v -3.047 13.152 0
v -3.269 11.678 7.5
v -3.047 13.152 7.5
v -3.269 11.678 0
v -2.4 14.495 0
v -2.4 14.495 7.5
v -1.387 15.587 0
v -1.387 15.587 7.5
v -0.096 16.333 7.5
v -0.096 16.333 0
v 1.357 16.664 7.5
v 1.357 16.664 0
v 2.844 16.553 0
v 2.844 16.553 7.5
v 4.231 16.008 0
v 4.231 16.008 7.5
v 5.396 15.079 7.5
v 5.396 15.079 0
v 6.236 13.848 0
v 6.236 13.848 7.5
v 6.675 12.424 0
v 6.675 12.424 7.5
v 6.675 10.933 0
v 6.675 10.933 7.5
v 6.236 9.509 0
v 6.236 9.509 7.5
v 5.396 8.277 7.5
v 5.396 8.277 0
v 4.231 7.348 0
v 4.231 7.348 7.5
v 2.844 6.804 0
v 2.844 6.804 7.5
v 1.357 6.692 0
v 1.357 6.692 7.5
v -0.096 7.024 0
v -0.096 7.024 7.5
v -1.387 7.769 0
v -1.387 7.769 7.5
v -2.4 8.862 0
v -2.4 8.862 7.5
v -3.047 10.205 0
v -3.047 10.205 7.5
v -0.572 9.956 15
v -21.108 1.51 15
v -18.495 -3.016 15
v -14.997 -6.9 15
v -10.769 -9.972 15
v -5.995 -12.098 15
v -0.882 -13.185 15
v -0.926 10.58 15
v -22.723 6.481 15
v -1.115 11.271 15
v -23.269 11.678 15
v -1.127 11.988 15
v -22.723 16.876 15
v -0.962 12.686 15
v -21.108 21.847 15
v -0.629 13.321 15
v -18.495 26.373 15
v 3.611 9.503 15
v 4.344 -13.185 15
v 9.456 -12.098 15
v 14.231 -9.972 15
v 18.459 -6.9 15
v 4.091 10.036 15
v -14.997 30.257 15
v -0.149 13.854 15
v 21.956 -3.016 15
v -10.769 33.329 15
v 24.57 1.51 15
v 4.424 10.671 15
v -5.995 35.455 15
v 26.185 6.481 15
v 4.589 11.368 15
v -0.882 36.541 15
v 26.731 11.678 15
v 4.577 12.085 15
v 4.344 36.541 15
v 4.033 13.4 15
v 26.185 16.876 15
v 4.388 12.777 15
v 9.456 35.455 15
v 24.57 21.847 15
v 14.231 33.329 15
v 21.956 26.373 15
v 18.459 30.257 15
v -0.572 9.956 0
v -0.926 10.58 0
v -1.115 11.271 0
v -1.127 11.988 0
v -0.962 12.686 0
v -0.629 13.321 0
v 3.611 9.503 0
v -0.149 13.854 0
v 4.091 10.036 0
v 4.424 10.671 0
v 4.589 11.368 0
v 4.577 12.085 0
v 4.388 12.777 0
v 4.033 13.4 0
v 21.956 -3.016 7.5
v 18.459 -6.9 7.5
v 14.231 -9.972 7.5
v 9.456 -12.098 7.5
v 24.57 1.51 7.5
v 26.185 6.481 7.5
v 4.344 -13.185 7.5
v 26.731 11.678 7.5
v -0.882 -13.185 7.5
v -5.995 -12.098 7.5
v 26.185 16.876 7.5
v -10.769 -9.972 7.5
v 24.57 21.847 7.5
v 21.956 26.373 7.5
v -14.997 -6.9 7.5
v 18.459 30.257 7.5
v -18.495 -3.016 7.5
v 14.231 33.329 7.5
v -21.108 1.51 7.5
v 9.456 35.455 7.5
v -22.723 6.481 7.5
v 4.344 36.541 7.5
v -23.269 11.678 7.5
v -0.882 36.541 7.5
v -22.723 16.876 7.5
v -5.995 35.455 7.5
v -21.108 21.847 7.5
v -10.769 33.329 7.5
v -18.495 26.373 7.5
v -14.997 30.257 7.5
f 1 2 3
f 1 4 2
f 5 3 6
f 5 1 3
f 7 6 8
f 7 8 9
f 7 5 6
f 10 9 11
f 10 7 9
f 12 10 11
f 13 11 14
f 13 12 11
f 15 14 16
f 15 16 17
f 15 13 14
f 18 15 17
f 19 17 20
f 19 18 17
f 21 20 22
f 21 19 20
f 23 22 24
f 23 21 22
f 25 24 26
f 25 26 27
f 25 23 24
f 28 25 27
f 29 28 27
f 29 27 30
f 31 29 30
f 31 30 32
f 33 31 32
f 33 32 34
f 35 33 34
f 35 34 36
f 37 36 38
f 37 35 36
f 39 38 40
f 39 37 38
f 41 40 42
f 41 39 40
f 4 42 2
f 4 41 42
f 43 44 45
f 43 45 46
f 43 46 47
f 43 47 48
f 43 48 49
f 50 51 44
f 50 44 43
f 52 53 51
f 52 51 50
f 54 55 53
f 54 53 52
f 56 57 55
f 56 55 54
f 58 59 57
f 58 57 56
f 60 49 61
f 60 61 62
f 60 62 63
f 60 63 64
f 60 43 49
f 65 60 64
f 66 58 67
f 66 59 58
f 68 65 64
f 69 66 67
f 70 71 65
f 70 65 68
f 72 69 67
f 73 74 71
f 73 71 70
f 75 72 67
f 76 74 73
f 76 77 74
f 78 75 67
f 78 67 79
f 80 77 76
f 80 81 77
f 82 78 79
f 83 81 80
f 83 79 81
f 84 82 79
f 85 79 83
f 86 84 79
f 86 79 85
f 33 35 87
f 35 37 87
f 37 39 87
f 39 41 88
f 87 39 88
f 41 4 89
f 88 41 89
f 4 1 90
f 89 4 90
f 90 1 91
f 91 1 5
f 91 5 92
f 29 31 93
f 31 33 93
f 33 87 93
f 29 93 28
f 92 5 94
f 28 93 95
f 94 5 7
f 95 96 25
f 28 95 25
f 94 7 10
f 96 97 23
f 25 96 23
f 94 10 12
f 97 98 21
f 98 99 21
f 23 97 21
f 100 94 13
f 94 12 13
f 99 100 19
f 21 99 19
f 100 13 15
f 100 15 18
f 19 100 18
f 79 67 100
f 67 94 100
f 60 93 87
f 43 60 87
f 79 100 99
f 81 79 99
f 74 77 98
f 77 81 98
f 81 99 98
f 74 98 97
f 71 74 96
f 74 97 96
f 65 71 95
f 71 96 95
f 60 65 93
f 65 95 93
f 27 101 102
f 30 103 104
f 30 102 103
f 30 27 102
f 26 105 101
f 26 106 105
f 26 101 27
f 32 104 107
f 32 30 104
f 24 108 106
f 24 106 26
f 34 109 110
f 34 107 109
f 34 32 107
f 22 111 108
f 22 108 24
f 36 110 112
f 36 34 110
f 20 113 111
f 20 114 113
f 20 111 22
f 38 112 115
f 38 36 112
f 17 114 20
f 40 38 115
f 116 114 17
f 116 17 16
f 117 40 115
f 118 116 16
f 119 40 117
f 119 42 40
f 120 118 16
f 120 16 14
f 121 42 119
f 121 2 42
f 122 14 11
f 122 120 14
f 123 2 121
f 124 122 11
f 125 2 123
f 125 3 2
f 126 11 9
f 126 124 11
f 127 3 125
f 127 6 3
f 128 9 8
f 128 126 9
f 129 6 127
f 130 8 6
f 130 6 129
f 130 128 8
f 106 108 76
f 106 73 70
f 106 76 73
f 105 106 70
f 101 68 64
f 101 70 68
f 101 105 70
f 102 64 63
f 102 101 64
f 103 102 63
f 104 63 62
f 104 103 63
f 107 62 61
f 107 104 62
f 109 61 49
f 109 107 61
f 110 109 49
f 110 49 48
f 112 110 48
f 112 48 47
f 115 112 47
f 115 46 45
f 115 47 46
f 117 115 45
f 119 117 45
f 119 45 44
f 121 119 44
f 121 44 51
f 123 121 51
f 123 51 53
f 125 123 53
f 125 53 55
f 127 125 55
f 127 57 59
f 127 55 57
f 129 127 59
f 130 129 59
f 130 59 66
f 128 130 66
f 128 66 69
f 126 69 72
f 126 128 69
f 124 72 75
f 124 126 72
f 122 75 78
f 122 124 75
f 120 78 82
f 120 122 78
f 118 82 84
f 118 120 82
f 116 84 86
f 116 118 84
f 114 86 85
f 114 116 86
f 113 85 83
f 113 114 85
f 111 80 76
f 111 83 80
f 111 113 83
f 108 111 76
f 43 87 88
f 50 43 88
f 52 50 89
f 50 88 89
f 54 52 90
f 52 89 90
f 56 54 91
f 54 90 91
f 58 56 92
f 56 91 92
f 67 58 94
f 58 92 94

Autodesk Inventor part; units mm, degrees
ref_plane "YZ Plane" through (0, 0, 0) normal (1, 0, 0) x (0, 1, 0)
ref_plane "XZ Plane" through (0, 0, 0) normal (0, 1, 0) x (-1, 0, 0)
ref_plane "XY Plane" through (0, 0, 0) normal (0, 0, 1) x (1, 0, 0)
sketch "Sketch1" plane through (0, 0, 0) normal (0, 0, 1) x (1, 0, 0)
  arc A0 (3.5439, 9.7114) -> (3.9233, 13.2109) centre (1.7309, 11.6783) ccw projected
  line L0 (3.9233, 13.2109) -> (-0.0821, 13.6452) projected
  arc A1 (-0.0821, 13.6452) -> (-0.4616, 10.1457) centre (1.7309, 11.6783) ccw projected
  line L1 (-0.4616, 10.1457) -> (3.5439, 9.7114) projected
  circle A2 centre (1.7309, 11.6783) radius 1.04 projected
  circle A3 centre (1.7309, 11.6783) radius 25
  line L2 (-0.1489, 13.8536) -> (4.0332, 13.4001)
  arc A4 (3.6107, 9.503) -> (4.0332, 13.4001) centre (1.7309, 11.6783) ccw
  line L3 (3.6107, 9.503) -> (-0.5715, 9.9564)
  arc A5 (-0.1489, 13.8536) -> (-0.5715, 9.9564) centre (1.7309, 11.6783) ccw
  point P0 (0, 0)
  dimension "d0" = 50
  dimension "d1" = 0.2
extrude "Extrusion1" add sketch "Sketch1" along normal blind 15 contours A3
sketch "Sketch2" plane through (1.7309, 11.6783, 0) normal (0, 0, -1) x (-1, 0, 0)
  arc A0 (-2.3024, 1.7218) -> (-1.8798, -2.1753) centre (0, 0) ccw projected
  circle A1 centre (0, 0) radius 25 projected
  line L0 (-1.8798, -2.1753) -> (2.3024, -1.7218) projected
  arc A2 (-2.3024, 1.7218) -> (-1.8798, -2.1753) centre (0, 0) ccw projected
  line L1 (1.8798, 2.1753) -> (-2.3024, 1.7218) projected
  arc A3 (2.3024, -1.7218) -> (1.8798, 2.1753) centre (0, 0) ccw projected
  circle A4 centre (0, 0) radius 5
  circle A5 centre (0, 0) radius 25
  point P0 (1.7309, -11.6783)
  dimension "d4" = 10
extrude "Extrusion2" cut sketch "Sketch2" against normal blind 7.5 contours A1
properties part number "Wheel"
